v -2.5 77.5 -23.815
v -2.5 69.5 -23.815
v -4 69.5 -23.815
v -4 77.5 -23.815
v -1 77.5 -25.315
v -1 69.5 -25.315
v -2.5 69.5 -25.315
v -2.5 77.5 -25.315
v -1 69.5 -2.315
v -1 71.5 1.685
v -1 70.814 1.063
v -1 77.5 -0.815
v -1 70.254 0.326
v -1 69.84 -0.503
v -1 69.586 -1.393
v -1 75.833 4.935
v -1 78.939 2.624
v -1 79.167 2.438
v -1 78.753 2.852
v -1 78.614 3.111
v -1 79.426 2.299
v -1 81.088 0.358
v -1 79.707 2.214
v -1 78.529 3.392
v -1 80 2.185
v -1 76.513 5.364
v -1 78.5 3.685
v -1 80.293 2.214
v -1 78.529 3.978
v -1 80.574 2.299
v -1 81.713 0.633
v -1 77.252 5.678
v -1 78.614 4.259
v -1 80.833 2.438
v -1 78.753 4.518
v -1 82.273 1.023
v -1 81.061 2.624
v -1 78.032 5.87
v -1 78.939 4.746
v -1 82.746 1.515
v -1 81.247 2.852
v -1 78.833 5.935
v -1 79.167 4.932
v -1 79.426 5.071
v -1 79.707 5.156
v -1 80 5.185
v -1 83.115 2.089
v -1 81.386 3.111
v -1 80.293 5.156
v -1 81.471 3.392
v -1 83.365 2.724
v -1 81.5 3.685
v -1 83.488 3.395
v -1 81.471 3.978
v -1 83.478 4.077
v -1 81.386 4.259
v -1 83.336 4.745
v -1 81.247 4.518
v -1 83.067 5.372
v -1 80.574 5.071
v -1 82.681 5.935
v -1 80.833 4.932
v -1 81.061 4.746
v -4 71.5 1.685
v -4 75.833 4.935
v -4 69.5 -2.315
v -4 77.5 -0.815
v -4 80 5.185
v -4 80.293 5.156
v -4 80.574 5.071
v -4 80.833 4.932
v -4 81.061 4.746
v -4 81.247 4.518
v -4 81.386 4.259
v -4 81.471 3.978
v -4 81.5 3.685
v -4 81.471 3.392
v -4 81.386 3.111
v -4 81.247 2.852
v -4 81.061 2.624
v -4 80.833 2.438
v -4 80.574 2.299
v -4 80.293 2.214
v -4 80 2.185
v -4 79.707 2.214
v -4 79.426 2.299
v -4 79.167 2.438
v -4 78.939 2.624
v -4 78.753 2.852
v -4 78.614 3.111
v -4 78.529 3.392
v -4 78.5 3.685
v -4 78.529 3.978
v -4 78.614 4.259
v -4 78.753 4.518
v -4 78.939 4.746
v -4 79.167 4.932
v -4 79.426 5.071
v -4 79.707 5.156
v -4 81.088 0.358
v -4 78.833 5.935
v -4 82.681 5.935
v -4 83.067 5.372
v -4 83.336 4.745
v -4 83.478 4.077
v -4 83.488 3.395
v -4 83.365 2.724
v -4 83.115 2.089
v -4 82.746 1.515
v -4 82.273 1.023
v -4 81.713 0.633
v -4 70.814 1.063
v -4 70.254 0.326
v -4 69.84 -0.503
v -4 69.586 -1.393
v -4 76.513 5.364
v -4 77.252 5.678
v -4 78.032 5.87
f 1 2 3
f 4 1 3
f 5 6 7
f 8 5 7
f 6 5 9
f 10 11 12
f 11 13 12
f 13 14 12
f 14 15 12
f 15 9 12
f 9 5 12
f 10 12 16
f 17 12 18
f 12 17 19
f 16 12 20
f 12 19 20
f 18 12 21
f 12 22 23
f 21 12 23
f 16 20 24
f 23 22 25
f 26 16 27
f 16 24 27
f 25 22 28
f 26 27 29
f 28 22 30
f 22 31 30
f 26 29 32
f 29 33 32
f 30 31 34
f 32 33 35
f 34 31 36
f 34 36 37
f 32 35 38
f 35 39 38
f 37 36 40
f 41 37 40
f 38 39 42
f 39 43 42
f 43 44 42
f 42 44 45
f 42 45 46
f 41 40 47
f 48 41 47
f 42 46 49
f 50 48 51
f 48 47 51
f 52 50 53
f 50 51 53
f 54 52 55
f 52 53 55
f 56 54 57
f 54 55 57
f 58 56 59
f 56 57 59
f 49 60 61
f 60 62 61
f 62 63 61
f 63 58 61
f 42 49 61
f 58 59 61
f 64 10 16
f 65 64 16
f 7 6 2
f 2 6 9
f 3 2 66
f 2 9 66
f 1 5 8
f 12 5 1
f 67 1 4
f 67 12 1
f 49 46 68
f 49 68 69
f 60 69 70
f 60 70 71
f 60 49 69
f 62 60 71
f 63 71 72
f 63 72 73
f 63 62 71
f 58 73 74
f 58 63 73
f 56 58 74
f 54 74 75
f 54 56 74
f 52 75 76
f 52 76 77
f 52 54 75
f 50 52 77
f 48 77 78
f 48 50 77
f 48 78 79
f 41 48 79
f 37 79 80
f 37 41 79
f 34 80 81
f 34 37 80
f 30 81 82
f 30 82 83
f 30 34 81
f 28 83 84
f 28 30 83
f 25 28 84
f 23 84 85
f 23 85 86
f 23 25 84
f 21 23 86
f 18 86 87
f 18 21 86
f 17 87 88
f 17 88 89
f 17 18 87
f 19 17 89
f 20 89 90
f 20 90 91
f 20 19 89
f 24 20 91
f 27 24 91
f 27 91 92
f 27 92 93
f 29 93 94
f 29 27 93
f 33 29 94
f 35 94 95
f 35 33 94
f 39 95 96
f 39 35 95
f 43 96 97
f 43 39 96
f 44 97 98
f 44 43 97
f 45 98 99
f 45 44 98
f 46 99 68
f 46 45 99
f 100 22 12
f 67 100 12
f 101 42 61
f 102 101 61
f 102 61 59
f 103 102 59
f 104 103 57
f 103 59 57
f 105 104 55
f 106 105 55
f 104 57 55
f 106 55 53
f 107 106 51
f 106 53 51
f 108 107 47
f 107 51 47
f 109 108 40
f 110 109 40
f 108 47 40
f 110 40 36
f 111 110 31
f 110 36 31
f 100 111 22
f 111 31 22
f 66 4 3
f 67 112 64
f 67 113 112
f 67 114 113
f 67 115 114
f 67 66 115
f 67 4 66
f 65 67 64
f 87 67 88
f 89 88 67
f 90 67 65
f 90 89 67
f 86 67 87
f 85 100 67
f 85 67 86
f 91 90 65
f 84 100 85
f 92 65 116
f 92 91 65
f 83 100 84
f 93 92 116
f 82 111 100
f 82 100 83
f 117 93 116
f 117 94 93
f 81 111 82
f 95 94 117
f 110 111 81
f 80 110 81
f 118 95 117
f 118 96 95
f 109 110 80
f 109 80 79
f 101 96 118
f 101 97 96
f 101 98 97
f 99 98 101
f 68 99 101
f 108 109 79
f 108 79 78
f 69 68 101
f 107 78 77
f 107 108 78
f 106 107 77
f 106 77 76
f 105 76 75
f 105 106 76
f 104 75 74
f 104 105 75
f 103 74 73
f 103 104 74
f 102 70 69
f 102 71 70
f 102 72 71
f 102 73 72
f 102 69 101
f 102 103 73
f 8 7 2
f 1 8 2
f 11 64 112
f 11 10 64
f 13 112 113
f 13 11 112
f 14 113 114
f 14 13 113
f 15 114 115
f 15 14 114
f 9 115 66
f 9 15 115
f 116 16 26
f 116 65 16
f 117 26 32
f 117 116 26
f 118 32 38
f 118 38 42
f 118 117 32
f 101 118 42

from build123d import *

# Parameters (mm, degrees)
TAB_EXTRUDE_DEPTH       = 8
SKETCH3_R               = 1.5
SCREWHOLE_EXTRUDE_DEPTH = 3
STRUCTURAL_ROUNDING_R   = 5


with BuildPart() as part:
    # Sketch1 → Tab extrude (new body)
    with BuildSketch(Plane.XZ.offset(-69.5)):
        Polygon((-1, 0.185), (-1, -25.315), (-2.5, -25.315), (-2.5, -23.815), (-4, -23.815), (-4, 0.185), align=None)
    extrude(amount=-TAB_EXTRUDE_DEPTH)

    # Sketch3 → Screwhole extrude (add)
    with BuildSketch(Plane.ZY.offset(1)):
        with BuildLine():
            Line((0.185, 69.5), (5.935, 77.166666667))
            Line((5.935, 77.166666667), (5.935, 82.680951324))
            ThreePointArc((5.935, 82.680951324), (2.723639085, 83.365380393), (0.35837639, 81.087922497))
            Line((0.35837639, 81.087922497), (-0.815, 77.5))
            Line((-0.815, 77.5), (0.185, 77.5))
            Line((0.185, 77.5), (0.185, 69.5))
        make_face()
        with Locations((3.685, 80)):
            Circle(SKETCH3_R, mode=Mode.SUBTRACT)
    extrude(amount=SCREWHOLE_EXTRUDE_DEPTH)

    # Structural rounding
    structural_rounding_edges = [part.edges().sort_by_distance(p)[0] for p in [
        (-2.5, 77.166666667, 5.935),
        (-2.5, 69.5, 0.185),
    ]]
    fillet(structural_rounding_edges, radius=STRUCTURAL_ROUNDING_R)


solid = part.part
